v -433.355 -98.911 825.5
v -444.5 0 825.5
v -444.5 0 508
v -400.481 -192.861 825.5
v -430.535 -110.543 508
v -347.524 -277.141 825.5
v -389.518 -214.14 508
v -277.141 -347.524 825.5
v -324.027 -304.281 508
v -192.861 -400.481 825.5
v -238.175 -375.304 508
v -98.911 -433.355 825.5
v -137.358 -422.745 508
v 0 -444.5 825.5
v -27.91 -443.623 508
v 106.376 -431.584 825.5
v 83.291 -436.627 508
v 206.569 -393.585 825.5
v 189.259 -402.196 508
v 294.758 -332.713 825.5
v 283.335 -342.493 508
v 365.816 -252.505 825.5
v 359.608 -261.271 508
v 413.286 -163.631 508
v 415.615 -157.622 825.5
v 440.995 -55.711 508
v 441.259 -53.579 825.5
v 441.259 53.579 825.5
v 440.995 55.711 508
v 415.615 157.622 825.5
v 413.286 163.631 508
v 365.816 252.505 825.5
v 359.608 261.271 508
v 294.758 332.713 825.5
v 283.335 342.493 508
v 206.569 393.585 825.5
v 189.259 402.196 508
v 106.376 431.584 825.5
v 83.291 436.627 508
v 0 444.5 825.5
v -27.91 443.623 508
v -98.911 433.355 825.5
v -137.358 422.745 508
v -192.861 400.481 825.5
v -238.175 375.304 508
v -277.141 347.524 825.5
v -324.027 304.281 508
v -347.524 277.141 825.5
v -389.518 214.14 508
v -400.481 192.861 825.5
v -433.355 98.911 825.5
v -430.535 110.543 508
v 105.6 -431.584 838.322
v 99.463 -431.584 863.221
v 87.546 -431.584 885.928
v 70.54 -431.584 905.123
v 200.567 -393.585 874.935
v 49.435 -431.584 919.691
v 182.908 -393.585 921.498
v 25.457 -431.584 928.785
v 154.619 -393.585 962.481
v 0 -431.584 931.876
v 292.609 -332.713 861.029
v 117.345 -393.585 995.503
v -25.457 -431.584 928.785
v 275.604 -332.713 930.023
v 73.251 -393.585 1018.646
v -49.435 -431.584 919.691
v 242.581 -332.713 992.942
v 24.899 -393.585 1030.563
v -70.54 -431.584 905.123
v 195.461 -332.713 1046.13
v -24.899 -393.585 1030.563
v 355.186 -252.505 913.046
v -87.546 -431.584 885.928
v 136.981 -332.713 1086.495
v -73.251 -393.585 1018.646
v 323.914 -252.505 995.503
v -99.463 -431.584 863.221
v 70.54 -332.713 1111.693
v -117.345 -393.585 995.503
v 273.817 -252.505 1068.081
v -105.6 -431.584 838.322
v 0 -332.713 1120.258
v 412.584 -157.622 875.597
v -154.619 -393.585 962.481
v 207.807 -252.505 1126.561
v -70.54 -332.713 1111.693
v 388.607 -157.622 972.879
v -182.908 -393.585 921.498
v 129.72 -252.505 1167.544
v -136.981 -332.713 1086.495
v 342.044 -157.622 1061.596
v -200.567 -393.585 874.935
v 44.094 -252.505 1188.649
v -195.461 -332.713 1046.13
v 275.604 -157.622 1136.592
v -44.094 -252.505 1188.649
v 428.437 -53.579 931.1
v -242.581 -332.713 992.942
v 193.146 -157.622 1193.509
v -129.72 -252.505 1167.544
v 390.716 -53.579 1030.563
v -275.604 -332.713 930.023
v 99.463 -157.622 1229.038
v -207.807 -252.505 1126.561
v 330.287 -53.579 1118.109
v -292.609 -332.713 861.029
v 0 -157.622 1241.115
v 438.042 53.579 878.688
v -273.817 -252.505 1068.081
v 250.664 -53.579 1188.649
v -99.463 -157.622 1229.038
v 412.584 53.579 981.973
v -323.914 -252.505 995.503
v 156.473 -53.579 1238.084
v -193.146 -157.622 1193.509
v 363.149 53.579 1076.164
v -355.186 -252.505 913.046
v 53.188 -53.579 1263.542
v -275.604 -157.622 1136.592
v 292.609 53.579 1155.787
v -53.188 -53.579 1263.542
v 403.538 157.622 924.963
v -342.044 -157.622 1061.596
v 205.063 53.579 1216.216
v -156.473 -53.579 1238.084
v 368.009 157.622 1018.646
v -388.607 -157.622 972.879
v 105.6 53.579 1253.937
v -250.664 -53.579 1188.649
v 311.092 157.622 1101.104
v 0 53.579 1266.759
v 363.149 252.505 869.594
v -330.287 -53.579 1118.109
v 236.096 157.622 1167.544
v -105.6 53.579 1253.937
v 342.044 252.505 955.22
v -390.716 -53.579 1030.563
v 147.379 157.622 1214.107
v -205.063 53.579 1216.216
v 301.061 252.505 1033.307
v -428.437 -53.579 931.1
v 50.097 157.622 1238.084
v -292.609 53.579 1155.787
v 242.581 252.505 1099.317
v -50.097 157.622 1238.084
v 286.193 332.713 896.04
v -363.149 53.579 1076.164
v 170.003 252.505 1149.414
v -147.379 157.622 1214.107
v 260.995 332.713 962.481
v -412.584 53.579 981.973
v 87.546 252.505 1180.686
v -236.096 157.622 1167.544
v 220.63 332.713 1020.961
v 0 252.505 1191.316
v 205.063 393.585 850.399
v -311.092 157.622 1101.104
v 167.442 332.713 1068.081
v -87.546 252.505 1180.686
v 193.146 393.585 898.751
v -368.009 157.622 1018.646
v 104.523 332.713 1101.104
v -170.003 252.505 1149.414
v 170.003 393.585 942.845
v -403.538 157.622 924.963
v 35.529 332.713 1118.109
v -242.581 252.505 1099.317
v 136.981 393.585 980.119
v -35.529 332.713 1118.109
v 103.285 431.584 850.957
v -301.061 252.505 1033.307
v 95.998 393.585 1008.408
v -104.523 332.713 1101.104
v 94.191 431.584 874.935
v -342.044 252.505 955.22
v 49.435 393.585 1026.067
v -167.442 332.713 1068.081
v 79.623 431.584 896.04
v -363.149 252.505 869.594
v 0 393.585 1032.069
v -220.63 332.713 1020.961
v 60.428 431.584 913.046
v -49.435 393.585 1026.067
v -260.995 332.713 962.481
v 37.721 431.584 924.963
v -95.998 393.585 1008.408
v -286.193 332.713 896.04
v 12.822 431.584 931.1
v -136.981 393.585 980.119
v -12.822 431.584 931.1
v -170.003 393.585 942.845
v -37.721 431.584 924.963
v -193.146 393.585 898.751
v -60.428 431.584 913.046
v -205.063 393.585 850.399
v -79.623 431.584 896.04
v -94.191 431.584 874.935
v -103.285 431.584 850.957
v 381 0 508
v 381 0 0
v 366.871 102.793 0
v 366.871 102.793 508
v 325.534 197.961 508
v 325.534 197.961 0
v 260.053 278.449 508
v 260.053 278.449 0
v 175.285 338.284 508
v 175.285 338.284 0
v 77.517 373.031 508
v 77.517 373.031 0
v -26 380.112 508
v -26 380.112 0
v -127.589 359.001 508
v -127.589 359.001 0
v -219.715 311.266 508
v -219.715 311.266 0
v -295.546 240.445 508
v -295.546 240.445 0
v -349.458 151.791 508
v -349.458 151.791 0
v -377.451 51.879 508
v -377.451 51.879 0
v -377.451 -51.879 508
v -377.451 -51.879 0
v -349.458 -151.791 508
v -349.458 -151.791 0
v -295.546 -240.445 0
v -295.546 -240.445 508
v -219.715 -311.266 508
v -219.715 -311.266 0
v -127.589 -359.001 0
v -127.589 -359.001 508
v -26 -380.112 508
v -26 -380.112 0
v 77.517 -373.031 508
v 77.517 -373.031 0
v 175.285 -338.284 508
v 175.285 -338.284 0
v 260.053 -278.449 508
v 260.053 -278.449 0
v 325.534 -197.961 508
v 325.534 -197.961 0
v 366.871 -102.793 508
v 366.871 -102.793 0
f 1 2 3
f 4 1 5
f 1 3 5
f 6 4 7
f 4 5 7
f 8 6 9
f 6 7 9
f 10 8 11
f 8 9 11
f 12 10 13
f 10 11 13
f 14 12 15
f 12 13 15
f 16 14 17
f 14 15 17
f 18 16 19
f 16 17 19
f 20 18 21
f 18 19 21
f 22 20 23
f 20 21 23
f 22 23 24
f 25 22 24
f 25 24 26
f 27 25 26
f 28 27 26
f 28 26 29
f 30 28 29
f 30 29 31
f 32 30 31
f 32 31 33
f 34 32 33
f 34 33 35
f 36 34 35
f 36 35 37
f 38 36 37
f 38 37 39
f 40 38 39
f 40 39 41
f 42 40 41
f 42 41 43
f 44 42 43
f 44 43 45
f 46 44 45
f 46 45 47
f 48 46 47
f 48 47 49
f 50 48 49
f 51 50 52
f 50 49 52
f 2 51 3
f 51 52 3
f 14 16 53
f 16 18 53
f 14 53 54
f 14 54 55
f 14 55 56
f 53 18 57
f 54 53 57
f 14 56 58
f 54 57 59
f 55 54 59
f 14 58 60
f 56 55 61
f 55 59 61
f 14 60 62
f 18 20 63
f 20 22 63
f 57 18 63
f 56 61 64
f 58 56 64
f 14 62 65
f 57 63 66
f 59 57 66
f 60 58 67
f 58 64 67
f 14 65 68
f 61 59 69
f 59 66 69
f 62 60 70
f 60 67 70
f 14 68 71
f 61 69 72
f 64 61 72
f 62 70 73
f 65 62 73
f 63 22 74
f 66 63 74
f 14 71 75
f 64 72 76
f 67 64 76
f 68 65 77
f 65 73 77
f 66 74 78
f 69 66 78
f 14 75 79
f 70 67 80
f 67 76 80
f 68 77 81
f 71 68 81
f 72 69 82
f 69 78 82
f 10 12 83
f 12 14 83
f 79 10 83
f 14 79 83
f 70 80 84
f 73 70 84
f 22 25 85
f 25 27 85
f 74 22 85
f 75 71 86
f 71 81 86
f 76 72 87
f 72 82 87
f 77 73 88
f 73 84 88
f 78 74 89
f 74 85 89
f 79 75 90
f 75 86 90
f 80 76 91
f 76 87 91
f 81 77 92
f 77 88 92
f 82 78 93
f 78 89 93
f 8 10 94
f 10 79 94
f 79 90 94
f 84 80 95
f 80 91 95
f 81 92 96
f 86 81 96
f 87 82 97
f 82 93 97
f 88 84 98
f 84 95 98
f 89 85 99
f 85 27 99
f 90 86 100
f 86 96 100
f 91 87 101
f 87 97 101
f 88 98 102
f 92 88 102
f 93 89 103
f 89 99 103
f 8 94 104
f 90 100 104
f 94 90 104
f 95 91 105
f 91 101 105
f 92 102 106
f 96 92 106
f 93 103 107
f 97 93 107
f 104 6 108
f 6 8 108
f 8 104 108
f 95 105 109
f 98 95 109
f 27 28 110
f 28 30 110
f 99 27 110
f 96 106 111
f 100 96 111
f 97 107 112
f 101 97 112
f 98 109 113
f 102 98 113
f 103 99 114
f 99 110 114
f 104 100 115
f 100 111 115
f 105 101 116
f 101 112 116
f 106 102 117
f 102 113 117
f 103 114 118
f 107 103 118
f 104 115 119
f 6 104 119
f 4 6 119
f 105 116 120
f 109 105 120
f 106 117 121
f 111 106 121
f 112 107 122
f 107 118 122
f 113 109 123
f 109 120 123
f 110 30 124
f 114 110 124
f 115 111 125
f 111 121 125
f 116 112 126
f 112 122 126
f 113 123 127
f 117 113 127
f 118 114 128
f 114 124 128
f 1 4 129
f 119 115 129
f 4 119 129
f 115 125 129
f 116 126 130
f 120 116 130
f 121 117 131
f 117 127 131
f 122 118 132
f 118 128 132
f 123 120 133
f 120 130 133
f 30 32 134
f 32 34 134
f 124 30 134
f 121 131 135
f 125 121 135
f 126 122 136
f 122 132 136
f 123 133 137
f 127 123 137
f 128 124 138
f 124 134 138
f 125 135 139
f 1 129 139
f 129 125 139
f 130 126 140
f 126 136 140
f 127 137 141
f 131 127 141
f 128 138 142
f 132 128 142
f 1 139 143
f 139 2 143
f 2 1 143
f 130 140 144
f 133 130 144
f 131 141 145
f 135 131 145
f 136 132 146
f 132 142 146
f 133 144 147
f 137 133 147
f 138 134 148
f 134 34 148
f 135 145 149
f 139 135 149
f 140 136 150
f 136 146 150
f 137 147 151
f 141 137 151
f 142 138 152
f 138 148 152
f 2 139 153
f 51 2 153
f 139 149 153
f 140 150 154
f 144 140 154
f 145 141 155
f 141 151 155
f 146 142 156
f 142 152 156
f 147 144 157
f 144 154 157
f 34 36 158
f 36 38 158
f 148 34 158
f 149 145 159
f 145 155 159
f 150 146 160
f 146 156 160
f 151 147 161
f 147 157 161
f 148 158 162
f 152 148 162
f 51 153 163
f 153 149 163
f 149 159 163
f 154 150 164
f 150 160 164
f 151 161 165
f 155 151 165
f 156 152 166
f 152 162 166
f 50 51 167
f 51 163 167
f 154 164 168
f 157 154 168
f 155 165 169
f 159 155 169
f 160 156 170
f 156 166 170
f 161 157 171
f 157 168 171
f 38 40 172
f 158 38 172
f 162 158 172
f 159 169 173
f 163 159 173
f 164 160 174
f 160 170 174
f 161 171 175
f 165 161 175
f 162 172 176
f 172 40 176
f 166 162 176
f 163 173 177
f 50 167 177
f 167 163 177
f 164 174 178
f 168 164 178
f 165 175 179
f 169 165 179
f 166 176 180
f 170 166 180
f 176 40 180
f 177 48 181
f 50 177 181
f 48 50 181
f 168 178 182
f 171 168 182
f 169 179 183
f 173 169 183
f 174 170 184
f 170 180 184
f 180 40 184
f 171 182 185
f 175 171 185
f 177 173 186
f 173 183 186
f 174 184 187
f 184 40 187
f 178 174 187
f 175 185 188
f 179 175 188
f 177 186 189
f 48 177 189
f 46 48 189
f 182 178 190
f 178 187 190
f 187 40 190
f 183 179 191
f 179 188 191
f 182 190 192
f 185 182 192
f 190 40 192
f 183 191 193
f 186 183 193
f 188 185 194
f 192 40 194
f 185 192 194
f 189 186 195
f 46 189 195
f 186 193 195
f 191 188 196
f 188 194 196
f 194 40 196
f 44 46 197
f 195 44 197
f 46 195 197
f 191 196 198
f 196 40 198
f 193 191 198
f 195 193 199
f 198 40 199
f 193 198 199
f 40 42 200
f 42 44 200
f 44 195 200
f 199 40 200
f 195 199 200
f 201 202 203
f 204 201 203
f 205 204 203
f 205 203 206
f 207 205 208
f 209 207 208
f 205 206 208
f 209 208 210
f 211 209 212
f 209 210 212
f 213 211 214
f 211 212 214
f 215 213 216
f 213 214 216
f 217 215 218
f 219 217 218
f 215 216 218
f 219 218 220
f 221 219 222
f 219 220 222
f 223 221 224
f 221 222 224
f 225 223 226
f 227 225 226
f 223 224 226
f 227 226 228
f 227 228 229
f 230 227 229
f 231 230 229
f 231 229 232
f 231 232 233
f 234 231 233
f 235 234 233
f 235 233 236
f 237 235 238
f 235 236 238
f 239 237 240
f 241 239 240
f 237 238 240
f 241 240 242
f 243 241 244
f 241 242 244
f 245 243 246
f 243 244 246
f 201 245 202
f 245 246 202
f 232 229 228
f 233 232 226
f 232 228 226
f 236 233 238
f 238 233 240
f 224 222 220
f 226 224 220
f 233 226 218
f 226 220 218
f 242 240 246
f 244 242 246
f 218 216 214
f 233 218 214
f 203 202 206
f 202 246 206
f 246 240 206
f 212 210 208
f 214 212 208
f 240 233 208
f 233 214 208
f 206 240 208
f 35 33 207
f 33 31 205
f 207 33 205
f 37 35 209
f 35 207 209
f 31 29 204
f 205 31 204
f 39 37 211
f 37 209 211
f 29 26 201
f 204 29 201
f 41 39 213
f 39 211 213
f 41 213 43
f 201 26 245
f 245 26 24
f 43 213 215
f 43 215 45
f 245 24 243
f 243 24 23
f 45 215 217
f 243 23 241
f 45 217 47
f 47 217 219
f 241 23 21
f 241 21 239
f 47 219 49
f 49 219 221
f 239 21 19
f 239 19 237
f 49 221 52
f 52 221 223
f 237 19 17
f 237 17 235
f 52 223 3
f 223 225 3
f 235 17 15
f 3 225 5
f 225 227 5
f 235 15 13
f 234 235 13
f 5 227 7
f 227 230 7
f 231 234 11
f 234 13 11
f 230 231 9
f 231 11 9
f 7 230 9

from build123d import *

# Parameters (mm, degrees)
SKETCH7_R           = 381
BOSS_EXTRUDE3_DEPTH = 508
SKETCH8_R           = 444.5
BOSS_EXTRUDE4_DEPTH = 317.5


with BuildPart() as part:
    # Sketch7 → Boss-Extrude3 (new body)
    with BuildSketch(Plane.XY):
        Circle(SKETCH7_R)
    extrude(amount=BOSS_EXTRUDE3_DEPTH)

    # Sketch8 → Boss-Extrude4 (add)
    with BuildSketch(Plane.XY.offset(508)):
        with Locations(Location((0, 0, 0), (0, 0, 180))):
            Circle(SKETCH8_R)
    extrude(amount=BOSS_EXTRUDE4_DEPTH)

    # Sketch9 → Revolve1 (revolve)
    with BuildSketch(Plane.XY.offset(825.5)):
        with BuildLine():
            Line((0, 444.5), (0, -444.5))
            ThreePointArc((0, -444.5), (-444.5, 0), (0, 444.5))
        make_face()
    revolve(axis=Axis((0, 444.5, 825.5), (0, -1, 0)))


solid = part.part
